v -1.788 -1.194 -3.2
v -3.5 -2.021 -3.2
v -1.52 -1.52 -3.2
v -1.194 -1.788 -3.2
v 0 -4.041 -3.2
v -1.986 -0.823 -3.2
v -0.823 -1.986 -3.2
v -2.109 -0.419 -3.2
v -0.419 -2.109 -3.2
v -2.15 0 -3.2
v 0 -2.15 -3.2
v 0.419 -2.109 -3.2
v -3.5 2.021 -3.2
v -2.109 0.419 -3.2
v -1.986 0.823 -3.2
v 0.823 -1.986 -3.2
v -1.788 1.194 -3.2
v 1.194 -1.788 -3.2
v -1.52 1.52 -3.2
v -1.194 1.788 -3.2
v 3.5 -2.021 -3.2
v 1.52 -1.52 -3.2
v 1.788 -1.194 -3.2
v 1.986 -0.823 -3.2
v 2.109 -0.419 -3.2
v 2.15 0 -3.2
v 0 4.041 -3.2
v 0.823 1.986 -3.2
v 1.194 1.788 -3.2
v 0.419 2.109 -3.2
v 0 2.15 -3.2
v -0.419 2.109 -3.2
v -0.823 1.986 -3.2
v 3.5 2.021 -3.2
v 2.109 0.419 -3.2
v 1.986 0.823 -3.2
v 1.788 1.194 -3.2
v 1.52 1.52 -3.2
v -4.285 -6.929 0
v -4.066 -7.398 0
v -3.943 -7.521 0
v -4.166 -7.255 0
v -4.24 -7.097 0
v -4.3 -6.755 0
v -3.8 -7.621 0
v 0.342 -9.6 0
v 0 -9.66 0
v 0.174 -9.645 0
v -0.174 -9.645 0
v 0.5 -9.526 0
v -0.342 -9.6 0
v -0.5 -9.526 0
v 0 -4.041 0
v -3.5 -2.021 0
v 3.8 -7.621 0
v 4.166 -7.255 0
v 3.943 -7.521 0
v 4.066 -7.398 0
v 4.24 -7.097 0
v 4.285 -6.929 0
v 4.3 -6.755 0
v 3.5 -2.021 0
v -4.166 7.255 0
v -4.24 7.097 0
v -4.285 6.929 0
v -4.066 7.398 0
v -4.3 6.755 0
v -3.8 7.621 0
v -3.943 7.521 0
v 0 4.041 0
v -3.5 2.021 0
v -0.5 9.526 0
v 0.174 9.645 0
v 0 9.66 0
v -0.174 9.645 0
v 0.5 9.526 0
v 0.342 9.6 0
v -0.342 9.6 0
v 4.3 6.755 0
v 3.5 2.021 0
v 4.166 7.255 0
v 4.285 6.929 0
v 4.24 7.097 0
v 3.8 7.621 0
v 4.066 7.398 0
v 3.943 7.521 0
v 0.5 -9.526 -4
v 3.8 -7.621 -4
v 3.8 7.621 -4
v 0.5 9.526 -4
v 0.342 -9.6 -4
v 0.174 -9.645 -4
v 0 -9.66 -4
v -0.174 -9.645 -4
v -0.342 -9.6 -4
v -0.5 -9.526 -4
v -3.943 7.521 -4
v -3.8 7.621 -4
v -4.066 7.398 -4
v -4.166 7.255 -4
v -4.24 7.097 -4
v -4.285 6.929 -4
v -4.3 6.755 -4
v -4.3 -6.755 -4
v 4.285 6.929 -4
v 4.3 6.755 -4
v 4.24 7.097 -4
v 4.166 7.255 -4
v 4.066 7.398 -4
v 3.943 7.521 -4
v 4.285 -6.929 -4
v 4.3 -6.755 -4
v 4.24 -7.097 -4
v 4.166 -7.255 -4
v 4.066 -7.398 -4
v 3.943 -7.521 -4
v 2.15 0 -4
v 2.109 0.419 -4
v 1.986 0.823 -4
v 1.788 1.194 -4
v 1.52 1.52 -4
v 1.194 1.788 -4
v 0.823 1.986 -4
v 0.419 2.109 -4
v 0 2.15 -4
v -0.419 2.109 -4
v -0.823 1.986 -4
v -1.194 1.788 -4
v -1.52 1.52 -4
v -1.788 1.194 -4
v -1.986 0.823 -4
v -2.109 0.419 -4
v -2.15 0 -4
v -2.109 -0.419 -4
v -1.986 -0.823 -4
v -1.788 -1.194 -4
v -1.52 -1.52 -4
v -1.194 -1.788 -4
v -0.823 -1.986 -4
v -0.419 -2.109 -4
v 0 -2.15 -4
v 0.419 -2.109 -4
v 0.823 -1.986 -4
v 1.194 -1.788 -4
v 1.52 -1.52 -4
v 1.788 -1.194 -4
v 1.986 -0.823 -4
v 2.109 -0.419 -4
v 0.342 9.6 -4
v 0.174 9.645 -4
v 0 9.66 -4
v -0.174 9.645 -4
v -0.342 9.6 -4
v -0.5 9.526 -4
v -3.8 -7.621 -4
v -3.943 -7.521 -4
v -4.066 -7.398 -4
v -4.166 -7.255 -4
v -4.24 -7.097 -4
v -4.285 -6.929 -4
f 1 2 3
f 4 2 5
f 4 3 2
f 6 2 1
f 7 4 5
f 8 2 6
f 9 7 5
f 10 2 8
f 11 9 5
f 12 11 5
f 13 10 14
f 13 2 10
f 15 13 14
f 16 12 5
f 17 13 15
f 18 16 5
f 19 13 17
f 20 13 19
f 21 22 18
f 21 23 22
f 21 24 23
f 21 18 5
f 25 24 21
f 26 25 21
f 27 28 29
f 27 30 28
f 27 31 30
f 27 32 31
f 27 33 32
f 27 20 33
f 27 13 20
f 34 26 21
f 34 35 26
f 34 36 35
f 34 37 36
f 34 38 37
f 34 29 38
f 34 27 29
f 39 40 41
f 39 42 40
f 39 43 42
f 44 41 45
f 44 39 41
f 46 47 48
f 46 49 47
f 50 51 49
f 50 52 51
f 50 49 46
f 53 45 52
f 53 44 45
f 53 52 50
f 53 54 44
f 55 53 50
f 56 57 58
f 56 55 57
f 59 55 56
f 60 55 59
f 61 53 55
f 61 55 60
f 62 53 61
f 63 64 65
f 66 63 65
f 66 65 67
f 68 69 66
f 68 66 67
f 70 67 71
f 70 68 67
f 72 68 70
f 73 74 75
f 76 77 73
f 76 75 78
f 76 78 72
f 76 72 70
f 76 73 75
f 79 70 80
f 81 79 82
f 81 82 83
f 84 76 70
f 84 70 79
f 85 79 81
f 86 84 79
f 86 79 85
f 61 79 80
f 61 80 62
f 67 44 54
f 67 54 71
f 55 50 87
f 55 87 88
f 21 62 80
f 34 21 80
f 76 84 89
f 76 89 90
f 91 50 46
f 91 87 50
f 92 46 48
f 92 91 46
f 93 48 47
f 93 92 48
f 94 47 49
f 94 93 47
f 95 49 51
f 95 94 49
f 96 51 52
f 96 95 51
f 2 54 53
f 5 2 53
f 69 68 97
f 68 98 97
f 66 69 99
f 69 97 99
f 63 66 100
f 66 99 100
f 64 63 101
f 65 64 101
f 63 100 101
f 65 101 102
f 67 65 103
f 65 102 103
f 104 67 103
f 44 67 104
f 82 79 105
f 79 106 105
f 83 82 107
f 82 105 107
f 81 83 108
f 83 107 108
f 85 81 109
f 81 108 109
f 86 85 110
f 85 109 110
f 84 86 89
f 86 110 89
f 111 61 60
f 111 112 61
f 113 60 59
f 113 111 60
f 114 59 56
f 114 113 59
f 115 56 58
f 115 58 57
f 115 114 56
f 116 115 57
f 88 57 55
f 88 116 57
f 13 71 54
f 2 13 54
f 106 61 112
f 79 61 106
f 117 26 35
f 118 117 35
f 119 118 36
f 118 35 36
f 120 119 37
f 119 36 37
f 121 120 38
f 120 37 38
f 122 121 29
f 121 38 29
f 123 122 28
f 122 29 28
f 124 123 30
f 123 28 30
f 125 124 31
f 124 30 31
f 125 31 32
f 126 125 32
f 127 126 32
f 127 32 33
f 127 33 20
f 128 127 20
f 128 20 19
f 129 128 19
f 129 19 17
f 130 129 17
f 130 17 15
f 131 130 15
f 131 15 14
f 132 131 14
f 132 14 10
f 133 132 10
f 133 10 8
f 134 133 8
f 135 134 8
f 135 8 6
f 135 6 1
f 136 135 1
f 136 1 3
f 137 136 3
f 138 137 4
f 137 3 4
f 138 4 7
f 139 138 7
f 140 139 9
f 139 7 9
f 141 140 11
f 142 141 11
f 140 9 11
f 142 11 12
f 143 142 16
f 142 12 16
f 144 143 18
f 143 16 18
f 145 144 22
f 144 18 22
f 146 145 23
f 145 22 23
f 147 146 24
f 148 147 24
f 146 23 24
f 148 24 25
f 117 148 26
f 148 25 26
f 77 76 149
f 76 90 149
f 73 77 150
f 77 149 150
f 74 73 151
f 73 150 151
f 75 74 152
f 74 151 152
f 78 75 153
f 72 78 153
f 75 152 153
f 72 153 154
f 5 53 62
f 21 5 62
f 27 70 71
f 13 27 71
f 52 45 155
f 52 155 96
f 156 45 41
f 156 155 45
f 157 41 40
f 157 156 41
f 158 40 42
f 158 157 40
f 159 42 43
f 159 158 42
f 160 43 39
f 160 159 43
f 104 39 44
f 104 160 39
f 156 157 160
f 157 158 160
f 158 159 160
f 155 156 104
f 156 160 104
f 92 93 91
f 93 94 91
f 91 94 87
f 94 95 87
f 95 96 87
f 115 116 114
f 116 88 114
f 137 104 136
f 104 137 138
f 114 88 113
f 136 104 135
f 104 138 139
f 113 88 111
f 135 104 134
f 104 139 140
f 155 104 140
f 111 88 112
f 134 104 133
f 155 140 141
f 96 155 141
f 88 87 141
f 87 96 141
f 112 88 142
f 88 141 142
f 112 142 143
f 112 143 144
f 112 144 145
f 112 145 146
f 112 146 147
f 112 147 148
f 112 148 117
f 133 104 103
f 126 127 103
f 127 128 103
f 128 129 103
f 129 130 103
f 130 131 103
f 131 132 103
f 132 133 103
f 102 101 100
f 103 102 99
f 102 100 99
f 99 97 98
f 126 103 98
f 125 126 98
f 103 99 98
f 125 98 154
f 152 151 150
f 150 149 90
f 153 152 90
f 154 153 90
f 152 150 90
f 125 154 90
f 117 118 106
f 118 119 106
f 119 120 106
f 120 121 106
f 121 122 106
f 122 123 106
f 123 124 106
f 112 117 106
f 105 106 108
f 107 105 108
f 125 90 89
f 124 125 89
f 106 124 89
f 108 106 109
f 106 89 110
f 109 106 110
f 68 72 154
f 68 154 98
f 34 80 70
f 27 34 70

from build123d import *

# Parameters (mm, degrees)
F0_R     = 2.15
F1_DEPTH = 4
F2_DEPTH = 3.2
F3_R     = 1


with BuildPart() as f1:
    # F0 (on Top) → F1 (new body)
    with BuildSketch(Plane.XY):
        Polygon((4.3, -7.332348), (4.3, 7.332348), (0, 9.814955), (-4.3, 7.332348), (-4.3, -7.332348), (0, -9.814955), align=None)
        Polygon((0, 4.041452), (3.5, 2.020726), (3.5, -2.020726), (0, -4.041452), (-3.5, -2.020726), (-3.5, 2.020726), align=None, mode=Mode.SUBTRACT)
        Polygon((3.5, -2.020726), (3.5, 2.020726), (0, 4.041452), (-3.5, 2.020726), (-3.5, -2.020726), (0, -4.041452), align=None)
        Circle(F0_R, mode=Mode.SUBTRACT)
    extrude(amount=-F1_DEPTH)

    # F0 (on Top) → F2 (cut)
    with BuildSketch(Plane.XY):
        Polygon((3.5, -2.020726), (3.5, 2.020726), (0, 4.041452), (-3.5, 2.020726), (-3.5, -2.020726), (0, -4.041452), align=None)
        Circle(F0_R, mode=Mode.SUBTRACT)
    extrude(amount=-F2_DEPTH, mode=Mode.SUBTRACT)

    # F3
    f3_edges = [f1.edges().sort_by_distance(p)[0] for p in [
        (-4.3, 7.332348, -2),
        (0, 9.814955, -2),
        (4.3, 7.332348, -2),
        (4.3, -7.332348, -2),
        (0, -9.814955, -2),
        (-4.3, -7.332348, -2),
    ]]
    fillet(f3_edges, radius=F3_R)


solid = f1.part
